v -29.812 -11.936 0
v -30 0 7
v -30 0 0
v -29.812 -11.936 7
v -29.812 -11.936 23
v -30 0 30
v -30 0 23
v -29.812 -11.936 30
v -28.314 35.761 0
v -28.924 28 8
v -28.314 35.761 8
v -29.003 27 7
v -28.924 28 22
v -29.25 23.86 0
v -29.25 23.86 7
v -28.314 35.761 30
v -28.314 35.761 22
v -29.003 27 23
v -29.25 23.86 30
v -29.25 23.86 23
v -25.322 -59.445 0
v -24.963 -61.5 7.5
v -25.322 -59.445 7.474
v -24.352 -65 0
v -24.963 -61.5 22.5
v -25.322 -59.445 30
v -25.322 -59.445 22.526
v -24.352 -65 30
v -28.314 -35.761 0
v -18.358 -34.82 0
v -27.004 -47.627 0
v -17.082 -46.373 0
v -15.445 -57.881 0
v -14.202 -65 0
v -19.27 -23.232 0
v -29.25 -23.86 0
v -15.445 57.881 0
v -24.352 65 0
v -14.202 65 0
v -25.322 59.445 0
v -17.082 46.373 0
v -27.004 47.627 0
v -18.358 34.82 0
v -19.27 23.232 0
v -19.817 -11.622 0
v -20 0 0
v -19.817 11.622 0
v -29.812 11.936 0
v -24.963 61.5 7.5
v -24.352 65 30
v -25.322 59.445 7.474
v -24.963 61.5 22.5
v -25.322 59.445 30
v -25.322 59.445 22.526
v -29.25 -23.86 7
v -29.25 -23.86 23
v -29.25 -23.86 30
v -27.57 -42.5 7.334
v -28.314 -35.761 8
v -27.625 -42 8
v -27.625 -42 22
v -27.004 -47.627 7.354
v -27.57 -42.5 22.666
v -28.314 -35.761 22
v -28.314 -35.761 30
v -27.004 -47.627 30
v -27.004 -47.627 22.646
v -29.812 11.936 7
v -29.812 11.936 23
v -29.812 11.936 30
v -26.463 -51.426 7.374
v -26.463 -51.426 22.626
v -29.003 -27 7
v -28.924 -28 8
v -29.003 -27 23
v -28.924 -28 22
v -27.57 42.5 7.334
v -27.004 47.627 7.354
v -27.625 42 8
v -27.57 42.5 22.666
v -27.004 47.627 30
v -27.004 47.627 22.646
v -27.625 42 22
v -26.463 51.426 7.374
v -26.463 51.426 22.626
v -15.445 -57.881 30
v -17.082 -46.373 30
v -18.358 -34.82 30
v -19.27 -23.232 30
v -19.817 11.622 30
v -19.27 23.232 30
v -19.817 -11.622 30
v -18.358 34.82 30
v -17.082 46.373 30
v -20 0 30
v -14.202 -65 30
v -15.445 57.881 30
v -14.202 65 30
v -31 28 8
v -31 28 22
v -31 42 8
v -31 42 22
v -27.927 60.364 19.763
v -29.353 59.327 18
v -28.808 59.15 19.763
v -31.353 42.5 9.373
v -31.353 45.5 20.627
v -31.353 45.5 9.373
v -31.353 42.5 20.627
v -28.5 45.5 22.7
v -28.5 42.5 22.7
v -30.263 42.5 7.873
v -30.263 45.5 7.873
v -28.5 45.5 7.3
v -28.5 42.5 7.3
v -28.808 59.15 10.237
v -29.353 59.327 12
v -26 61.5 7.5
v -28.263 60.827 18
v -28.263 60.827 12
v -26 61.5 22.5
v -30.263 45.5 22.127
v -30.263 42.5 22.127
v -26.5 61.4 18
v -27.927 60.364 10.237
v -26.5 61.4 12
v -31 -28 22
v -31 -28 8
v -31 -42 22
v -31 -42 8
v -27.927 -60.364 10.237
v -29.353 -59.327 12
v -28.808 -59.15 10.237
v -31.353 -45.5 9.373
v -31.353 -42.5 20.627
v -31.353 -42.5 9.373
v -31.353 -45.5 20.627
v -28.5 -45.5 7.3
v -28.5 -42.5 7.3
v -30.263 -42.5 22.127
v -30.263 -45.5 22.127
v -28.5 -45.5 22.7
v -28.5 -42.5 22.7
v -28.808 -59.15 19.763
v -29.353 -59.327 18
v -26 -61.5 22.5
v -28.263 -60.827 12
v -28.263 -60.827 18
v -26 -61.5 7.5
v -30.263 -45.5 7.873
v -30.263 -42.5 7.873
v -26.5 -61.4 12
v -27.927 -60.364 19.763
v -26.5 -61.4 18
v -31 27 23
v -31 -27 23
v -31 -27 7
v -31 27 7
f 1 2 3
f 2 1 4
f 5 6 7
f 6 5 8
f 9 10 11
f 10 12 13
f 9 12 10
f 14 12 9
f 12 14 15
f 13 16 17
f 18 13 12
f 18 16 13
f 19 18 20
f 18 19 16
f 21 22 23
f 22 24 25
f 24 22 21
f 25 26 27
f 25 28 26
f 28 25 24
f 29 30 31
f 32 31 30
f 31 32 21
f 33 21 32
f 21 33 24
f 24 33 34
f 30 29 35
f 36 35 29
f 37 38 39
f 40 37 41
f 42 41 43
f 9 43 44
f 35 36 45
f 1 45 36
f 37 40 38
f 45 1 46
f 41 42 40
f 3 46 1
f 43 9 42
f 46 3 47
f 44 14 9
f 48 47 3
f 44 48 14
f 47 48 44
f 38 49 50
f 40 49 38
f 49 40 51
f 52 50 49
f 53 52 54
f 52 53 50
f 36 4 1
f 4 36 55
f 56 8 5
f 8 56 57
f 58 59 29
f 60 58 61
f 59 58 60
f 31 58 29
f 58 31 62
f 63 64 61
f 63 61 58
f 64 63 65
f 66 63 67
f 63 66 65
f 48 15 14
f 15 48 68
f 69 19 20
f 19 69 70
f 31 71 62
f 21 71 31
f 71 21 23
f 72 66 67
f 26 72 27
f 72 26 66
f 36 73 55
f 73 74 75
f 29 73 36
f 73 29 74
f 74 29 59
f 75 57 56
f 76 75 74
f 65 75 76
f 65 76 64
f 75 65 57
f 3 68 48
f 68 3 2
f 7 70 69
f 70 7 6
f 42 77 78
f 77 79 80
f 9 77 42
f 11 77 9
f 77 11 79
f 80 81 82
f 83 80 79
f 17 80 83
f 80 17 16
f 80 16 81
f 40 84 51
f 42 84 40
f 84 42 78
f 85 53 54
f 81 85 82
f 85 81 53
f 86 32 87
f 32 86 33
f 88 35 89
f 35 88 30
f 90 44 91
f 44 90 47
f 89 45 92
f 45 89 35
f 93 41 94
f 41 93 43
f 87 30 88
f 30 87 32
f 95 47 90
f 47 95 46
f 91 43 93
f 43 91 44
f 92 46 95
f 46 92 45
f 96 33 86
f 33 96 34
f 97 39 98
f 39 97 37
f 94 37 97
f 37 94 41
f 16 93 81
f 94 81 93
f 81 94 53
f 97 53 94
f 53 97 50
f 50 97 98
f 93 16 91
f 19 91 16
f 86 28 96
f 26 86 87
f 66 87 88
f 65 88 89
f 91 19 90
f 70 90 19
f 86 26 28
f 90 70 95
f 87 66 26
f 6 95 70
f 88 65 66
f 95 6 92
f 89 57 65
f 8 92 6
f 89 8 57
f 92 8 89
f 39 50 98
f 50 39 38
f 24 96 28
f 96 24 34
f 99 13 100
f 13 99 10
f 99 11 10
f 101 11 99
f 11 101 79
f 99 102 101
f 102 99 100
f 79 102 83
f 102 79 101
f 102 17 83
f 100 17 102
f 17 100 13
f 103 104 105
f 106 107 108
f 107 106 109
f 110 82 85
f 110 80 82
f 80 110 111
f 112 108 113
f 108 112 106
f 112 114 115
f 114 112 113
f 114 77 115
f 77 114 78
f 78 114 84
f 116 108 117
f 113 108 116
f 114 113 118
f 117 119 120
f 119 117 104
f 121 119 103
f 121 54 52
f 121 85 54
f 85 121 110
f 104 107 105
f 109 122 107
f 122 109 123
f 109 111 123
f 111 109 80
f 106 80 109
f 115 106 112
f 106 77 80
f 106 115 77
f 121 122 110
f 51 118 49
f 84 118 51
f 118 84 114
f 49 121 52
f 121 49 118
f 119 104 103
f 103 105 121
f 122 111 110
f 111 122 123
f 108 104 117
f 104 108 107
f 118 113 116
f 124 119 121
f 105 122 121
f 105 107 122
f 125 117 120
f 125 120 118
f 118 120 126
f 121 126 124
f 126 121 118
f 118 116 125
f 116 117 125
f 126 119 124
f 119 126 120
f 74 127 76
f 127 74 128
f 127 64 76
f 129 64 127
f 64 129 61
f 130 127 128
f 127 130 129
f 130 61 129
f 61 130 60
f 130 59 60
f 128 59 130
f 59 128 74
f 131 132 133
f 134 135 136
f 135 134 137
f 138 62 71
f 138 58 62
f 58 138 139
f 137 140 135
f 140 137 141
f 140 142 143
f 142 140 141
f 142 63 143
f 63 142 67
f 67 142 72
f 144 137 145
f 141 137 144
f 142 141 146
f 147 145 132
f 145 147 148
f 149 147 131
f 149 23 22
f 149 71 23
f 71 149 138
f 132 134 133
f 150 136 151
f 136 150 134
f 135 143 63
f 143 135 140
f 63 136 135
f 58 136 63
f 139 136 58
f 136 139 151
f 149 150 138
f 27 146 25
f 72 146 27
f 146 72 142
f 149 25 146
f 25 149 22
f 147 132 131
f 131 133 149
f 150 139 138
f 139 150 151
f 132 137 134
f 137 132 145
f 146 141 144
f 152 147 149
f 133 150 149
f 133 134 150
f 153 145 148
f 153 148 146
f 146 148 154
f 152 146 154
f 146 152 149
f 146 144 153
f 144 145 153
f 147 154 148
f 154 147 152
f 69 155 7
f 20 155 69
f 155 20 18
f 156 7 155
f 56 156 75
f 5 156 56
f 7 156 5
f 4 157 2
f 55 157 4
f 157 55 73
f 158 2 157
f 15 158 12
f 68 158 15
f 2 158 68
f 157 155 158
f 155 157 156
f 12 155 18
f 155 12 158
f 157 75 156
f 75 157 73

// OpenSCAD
module headlight() {
	//Simplified model
	cube([14,14,8],center=true);
}

module forCuboid(offsetx,offsety,offsetz) {
   
    for(i = [[-1,-1,-1,0],
             [1,-1,-1,1],
             [1,1,-1,2],
             [-1,1,-1,3],
             [-1,-1,1,4],
             [1,-1,1,5],
             [1,1,1,6],
             [-1,1,1,7]])
        {
            translate([offsetx*i[0],offsety*i[1],offsetz*i[2]])
            if (i[3] > $children-1){
                children(0);
            } else {
                children(i[3]);
            }
        }
}

module indicator() {
	//Simplfied model
    hull() {
        rad=3;
        forCuboid(8,1,6)
          {
          translate([1.6,0,3])
            sphere(r=rad);
          translate([0,-2,1.3])
              rotate([0,90,0])
                 cylinder(r=rad,h=3,center=true);
          cube([3,3,3],center=true);
          cube([3,3,3],center=true);
          translate([1.6,0,-3])
            sphere(r=rad);
          translate([0,-2,-1.3])
              rotate([0,90,0])
                 cylinder(r=rad,h=3,center=true);
          cube([3,3,3],center=true);
          cube([3,3,3],center=true);
        }
    }
}

module lights() {
	translate([4,-7,15])
		rotate([0,90,0])
			pcb();
	rotate([0,-90,0])
		color("grey",0.9)
			headlight();
	translate([1.5,17,0])
		rotate([0,0,-90])
			color("orange",0.9)
				indicator();
	
}


module pcb() {
	color("black")
		cube([30,27,2]);
}

module lightbar()
{	
	w=130;
    bumpwidth = 130;
	thickness = 30;
    
    intersection() {
        translate([-30,-bumpwidth/2,0])
        cube([30,bumpwidth,thickness]);

        translate([350,0,0])
        difference() {
            cylinder(h=thickness+10,r=380,$fn=200);
            translate([0,0,-1])
                cylinder(h=thickness+10,r=370,$fn=200);
        }
    }
}

module plate() {
	color("white")
		cube([2,54,16],center=true);	
}

lightbar();

translate([-27,35,15])
	lights();

translate([-27,-35,15])
	rotate([180,0,0])
		lights();

translate([-30,0,15])
	plate();
